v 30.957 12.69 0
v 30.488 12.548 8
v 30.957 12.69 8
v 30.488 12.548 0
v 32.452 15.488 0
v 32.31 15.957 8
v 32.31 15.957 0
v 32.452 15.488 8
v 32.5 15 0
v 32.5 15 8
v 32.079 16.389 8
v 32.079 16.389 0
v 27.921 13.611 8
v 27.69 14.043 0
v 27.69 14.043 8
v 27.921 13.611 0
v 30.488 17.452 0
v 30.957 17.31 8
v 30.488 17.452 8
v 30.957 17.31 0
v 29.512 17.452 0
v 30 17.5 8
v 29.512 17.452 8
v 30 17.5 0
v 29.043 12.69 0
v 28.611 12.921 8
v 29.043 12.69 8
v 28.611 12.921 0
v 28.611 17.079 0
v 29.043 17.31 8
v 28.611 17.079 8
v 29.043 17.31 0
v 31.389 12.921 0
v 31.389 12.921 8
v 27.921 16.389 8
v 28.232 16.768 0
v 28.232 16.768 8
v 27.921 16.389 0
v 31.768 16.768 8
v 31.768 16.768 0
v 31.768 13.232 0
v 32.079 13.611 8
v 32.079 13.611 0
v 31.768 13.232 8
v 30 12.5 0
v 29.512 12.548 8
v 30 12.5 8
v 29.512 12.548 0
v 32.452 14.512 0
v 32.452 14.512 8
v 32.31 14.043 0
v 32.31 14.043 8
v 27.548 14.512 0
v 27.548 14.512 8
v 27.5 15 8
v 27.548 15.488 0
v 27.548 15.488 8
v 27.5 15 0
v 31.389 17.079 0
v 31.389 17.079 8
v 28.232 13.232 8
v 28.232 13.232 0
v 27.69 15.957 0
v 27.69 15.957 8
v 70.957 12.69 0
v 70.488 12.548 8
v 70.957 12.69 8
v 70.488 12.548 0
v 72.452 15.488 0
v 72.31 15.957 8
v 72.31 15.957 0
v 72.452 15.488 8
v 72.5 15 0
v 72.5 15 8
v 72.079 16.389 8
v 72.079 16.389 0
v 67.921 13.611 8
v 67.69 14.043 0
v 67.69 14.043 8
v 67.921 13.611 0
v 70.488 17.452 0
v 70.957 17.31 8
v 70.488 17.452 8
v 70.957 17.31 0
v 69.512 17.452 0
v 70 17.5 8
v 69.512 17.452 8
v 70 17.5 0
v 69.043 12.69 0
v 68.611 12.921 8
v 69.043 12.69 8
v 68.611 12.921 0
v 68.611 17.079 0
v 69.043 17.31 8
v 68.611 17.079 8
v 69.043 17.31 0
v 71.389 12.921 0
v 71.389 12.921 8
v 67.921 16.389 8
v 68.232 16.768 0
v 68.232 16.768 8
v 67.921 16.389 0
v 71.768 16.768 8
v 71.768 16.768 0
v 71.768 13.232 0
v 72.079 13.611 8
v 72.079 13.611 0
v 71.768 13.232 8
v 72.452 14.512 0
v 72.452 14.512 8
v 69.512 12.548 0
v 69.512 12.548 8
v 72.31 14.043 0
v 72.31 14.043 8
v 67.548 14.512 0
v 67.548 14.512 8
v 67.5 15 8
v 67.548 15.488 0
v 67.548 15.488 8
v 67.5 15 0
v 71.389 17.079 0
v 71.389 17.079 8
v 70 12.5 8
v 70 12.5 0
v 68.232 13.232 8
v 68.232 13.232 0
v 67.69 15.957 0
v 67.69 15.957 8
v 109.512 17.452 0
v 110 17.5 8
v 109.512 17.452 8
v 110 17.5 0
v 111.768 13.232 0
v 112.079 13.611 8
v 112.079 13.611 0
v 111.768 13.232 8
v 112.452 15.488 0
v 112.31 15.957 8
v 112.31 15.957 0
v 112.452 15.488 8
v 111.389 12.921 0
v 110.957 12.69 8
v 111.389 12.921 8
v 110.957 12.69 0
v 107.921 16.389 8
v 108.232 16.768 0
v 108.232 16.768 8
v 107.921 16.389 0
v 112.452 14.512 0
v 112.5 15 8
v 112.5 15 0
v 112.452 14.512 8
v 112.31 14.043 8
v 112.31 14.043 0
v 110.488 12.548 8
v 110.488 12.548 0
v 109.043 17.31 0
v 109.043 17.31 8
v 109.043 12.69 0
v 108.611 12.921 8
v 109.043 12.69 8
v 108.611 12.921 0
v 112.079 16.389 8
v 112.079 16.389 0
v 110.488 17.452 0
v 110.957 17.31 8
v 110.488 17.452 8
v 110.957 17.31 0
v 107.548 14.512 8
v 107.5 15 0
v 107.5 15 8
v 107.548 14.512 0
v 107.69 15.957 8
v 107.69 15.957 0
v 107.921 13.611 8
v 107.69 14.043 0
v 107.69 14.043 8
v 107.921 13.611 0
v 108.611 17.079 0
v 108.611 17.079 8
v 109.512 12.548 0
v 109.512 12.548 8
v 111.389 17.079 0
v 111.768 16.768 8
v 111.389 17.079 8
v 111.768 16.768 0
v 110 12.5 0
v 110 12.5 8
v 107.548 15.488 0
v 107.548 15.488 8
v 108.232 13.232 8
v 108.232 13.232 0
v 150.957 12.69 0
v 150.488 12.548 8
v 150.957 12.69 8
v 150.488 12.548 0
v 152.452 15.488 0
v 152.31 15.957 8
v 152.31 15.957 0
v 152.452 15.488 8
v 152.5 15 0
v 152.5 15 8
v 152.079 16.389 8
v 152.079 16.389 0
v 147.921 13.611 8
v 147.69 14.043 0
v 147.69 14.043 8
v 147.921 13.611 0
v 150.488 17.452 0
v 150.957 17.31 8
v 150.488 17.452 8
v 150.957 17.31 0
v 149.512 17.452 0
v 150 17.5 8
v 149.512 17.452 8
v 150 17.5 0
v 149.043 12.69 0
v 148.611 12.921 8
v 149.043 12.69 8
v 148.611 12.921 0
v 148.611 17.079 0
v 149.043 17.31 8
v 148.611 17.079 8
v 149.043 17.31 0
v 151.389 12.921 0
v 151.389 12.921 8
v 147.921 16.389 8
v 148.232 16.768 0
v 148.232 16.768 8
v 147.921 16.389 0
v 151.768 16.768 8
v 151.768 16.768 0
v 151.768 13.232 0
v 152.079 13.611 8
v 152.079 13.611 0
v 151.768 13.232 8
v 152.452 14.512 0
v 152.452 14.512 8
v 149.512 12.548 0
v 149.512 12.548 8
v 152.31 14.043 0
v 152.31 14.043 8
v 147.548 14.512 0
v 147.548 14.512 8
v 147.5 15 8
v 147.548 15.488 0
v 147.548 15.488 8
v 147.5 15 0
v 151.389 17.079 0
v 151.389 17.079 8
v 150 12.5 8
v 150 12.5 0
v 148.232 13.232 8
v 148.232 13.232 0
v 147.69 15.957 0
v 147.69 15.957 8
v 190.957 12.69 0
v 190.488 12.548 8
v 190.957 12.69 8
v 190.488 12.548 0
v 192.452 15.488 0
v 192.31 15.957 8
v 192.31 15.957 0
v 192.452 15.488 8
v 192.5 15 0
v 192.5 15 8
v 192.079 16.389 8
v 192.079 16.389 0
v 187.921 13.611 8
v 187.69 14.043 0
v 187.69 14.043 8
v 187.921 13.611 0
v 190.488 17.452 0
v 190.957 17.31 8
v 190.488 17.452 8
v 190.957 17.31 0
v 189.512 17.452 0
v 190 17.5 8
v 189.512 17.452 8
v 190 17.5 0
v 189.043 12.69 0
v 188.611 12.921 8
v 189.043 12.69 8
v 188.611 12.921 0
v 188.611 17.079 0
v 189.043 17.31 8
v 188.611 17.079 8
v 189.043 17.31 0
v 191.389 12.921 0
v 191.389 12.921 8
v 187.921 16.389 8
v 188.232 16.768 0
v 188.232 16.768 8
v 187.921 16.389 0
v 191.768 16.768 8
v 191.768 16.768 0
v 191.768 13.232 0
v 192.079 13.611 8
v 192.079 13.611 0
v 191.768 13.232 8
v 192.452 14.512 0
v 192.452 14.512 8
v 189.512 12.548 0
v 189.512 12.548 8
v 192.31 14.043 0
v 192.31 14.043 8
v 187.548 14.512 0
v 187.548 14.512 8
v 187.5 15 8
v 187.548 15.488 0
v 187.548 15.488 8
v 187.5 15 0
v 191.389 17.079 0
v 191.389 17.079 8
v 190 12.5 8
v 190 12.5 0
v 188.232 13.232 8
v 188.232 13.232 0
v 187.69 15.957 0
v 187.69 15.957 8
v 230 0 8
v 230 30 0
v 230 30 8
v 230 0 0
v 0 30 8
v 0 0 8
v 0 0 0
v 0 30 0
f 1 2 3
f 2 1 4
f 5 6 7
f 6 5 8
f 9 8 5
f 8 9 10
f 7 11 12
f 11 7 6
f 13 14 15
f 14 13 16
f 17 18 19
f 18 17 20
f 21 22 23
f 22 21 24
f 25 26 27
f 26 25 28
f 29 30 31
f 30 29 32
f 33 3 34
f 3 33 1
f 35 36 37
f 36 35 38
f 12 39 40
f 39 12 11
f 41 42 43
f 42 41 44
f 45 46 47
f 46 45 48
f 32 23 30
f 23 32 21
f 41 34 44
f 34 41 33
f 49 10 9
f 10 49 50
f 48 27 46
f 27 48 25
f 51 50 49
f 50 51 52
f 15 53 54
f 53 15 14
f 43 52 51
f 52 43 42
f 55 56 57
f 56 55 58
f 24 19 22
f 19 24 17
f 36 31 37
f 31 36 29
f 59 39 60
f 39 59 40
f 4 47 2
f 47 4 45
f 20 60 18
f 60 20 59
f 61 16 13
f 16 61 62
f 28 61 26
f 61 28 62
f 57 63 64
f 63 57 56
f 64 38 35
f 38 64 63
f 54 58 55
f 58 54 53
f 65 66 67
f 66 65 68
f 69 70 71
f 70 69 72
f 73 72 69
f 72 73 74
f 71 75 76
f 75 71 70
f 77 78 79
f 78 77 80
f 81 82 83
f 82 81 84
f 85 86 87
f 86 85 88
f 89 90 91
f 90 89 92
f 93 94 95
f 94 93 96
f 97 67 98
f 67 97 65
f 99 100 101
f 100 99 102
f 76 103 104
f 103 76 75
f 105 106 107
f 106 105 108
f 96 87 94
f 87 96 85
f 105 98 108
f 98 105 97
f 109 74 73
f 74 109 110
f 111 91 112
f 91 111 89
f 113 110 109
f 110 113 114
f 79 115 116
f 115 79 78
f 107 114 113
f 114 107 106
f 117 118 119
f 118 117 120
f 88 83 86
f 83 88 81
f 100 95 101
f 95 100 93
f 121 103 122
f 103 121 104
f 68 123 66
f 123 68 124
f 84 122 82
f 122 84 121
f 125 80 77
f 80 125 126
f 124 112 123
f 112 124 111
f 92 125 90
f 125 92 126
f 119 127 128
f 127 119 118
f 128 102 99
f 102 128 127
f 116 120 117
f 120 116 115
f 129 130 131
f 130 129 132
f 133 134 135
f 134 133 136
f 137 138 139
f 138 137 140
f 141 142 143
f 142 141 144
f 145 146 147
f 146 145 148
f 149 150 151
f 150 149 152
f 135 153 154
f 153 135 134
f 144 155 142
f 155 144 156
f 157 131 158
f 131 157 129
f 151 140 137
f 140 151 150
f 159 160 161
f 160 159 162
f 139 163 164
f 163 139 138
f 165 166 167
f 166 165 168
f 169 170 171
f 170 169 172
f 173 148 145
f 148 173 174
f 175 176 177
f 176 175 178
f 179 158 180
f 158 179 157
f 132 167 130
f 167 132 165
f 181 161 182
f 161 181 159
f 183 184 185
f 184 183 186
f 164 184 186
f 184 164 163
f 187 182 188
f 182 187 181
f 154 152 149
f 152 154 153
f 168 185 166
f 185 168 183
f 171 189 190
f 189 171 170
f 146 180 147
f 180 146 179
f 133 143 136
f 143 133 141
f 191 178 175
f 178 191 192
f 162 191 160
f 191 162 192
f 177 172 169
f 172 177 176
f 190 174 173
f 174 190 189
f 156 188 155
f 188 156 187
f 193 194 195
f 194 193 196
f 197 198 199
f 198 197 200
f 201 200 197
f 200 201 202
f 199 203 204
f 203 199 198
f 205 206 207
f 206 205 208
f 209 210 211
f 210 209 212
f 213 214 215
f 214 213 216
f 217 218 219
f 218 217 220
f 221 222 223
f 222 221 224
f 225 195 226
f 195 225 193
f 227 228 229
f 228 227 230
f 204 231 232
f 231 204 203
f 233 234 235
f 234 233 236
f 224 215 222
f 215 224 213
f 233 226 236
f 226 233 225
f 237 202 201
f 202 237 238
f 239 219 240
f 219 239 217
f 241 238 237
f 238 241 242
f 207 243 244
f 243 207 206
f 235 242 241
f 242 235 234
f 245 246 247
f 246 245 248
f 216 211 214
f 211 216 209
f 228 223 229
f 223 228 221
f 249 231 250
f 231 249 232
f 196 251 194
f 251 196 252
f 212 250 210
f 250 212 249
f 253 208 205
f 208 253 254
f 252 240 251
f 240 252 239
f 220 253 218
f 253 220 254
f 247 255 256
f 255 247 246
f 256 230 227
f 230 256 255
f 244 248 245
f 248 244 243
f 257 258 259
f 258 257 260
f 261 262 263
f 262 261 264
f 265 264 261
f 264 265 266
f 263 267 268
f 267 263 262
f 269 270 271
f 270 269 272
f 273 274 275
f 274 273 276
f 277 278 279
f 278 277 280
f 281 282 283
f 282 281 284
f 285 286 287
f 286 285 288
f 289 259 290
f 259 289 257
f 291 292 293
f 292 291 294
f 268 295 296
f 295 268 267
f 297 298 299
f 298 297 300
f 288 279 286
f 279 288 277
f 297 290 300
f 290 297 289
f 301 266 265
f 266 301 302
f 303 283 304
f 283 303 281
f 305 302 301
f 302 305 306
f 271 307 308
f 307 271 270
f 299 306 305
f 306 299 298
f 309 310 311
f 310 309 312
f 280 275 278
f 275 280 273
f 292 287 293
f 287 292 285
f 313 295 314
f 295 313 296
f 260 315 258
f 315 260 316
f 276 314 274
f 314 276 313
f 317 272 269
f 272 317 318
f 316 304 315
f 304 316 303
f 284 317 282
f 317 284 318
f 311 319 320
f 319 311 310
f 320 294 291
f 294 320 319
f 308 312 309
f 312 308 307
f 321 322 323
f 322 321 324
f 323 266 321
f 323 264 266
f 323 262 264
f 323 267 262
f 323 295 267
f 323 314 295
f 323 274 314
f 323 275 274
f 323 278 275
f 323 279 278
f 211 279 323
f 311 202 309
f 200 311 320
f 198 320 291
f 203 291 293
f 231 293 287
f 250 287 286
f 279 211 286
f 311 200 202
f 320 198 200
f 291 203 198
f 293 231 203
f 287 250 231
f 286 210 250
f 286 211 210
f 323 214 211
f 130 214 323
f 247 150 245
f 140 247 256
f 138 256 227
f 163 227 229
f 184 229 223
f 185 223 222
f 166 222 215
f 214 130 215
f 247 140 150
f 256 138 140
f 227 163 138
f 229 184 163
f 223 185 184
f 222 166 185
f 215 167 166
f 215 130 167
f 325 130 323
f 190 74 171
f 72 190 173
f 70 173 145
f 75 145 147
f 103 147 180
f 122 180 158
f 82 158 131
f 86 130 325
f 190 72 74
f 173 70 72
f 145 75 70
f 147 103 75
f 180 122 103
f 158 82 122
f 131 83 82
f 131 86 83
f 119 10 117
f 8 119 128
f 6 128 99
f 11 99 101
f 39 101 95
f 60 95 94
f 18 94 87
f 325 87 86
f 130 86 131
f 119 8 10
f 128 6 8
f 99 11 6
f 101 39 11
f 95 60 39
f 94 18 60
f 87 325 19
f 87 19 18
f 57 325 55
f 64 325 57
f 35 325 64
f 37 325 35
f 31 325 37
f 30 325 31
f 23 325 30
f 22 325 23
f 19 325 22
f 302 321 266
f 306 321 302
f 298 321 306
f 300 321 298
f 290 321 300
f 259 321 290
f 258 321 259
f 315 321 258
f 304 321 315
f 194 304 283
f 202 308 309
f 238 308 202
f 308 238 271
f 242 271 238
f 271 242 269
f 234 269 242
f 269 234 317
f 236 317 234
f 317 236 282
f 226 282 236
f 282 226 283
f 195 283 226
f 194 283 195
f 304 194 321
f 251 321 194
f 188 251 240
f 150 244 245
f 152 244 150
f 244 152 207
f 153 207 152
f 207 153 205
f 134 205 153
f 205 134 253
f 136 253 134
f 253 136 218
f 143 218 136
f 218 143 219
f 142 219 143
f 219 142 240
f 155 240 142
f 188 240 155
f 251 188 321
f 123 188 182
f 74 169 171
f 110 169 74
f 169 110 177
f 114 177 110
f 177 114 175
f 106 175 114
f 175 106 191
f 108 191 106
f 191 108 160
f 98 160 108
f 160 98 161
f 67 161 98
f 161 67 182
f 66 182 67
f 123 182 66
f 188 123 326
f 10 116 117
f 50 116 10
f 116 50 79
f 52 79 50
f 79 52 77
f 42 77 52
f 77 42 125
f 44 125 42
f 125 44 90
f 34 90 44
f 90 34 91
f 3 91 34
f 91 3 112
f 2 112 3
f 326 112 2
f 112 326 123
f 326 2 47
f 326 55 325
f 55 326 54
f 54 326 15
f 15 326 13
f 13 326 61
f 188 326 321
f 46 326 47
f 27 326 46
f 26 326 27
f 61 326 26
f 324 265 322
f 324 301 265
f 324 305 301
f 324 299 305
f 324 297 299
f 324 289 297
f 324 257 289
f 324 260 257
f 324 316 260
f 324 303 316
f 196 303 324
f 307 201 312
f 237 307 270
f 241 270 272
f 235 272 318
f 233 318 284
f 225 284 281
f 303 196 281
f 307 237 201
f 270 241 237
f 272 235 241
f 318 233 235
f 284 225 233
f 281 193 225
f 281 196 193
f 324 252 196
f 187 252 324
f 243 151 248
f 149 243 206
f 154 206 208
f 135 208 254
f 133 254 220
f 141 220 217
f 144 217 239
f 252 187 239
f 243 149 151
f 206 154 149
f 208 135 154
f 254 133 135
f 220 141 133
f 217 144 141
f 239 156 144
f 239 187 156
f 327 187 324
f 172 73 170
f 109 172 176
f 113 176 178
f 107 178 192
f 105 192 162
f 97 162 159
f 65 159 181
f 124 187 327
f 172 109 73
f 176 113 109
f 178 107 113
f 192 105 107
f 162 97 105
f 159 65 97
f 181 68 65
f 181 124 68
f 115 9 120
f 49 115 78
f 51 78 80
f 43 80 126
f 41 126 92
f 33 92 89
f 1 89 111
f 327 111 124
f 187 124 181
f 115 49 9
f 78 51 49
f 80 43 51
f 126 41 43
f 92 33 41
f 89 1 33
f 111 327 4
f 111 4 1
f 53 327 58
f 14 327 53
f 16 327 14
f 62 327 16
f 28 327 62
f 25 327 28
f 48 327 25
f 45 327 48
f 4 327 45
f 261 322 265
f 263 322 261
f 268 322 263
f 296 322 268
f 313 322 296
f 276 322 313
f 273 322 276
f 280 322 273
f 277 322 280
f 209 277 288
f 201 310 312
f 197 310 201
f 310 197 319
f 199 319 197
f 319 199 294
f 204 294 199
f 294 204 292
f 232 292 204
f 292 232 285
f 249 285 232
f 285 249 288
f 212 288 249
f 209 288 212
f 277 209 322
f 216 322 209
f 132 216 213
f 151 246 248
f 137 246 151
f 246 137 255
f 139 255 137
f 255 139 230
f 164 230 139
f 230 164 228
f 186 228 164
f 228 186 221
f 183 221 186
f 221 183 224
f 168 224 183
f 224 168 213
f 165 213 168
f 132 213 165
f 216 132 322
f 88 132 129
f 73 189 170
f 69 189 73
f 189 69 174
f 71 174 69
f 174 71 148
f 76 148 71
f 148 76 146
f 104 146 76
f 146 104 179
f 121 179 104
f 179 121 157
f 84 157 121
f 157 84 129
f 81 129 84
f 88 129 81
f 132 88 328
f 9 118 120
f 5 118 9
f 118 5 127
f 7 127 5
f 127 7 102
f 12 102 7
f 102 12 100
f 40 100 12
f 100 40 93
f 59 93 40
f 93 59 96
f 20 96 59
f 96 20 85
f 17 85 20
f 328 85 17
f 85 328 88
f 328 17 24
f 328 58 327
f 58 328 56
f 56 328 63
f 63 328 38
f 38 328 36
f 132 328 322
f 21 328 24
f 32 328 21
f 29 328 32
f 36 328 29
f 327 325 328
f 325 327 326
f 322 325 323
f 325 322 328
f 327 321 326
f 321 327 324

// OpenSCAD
$fn = 32;

// ----------------------------------------------------------------------
// Long rail: 200-250 mm mounting rail
// ----------------------------------------------------------------------

// --- parameters (mm) ---
rail_l = 230;             // rail length, X
rail_w = 30;              // rail width, Y
rail_t = 8;               // rail thickness, Z
hole_d = 5;               // mounting hole diameter
hole_start = 30;          // first hole offset from the end
hole_pitch = 40;          // hole pitch
holes = 5;                // number of holes

difference() {
  cube([rail_l, rail_w, rail_t]);
  for (i = [0 : holes - 1])
    translate([hole_start + i * hole_pitch, rail_w / 2, -1])
      cylinder(h = rail_t + 2, d = hole_d);
}
